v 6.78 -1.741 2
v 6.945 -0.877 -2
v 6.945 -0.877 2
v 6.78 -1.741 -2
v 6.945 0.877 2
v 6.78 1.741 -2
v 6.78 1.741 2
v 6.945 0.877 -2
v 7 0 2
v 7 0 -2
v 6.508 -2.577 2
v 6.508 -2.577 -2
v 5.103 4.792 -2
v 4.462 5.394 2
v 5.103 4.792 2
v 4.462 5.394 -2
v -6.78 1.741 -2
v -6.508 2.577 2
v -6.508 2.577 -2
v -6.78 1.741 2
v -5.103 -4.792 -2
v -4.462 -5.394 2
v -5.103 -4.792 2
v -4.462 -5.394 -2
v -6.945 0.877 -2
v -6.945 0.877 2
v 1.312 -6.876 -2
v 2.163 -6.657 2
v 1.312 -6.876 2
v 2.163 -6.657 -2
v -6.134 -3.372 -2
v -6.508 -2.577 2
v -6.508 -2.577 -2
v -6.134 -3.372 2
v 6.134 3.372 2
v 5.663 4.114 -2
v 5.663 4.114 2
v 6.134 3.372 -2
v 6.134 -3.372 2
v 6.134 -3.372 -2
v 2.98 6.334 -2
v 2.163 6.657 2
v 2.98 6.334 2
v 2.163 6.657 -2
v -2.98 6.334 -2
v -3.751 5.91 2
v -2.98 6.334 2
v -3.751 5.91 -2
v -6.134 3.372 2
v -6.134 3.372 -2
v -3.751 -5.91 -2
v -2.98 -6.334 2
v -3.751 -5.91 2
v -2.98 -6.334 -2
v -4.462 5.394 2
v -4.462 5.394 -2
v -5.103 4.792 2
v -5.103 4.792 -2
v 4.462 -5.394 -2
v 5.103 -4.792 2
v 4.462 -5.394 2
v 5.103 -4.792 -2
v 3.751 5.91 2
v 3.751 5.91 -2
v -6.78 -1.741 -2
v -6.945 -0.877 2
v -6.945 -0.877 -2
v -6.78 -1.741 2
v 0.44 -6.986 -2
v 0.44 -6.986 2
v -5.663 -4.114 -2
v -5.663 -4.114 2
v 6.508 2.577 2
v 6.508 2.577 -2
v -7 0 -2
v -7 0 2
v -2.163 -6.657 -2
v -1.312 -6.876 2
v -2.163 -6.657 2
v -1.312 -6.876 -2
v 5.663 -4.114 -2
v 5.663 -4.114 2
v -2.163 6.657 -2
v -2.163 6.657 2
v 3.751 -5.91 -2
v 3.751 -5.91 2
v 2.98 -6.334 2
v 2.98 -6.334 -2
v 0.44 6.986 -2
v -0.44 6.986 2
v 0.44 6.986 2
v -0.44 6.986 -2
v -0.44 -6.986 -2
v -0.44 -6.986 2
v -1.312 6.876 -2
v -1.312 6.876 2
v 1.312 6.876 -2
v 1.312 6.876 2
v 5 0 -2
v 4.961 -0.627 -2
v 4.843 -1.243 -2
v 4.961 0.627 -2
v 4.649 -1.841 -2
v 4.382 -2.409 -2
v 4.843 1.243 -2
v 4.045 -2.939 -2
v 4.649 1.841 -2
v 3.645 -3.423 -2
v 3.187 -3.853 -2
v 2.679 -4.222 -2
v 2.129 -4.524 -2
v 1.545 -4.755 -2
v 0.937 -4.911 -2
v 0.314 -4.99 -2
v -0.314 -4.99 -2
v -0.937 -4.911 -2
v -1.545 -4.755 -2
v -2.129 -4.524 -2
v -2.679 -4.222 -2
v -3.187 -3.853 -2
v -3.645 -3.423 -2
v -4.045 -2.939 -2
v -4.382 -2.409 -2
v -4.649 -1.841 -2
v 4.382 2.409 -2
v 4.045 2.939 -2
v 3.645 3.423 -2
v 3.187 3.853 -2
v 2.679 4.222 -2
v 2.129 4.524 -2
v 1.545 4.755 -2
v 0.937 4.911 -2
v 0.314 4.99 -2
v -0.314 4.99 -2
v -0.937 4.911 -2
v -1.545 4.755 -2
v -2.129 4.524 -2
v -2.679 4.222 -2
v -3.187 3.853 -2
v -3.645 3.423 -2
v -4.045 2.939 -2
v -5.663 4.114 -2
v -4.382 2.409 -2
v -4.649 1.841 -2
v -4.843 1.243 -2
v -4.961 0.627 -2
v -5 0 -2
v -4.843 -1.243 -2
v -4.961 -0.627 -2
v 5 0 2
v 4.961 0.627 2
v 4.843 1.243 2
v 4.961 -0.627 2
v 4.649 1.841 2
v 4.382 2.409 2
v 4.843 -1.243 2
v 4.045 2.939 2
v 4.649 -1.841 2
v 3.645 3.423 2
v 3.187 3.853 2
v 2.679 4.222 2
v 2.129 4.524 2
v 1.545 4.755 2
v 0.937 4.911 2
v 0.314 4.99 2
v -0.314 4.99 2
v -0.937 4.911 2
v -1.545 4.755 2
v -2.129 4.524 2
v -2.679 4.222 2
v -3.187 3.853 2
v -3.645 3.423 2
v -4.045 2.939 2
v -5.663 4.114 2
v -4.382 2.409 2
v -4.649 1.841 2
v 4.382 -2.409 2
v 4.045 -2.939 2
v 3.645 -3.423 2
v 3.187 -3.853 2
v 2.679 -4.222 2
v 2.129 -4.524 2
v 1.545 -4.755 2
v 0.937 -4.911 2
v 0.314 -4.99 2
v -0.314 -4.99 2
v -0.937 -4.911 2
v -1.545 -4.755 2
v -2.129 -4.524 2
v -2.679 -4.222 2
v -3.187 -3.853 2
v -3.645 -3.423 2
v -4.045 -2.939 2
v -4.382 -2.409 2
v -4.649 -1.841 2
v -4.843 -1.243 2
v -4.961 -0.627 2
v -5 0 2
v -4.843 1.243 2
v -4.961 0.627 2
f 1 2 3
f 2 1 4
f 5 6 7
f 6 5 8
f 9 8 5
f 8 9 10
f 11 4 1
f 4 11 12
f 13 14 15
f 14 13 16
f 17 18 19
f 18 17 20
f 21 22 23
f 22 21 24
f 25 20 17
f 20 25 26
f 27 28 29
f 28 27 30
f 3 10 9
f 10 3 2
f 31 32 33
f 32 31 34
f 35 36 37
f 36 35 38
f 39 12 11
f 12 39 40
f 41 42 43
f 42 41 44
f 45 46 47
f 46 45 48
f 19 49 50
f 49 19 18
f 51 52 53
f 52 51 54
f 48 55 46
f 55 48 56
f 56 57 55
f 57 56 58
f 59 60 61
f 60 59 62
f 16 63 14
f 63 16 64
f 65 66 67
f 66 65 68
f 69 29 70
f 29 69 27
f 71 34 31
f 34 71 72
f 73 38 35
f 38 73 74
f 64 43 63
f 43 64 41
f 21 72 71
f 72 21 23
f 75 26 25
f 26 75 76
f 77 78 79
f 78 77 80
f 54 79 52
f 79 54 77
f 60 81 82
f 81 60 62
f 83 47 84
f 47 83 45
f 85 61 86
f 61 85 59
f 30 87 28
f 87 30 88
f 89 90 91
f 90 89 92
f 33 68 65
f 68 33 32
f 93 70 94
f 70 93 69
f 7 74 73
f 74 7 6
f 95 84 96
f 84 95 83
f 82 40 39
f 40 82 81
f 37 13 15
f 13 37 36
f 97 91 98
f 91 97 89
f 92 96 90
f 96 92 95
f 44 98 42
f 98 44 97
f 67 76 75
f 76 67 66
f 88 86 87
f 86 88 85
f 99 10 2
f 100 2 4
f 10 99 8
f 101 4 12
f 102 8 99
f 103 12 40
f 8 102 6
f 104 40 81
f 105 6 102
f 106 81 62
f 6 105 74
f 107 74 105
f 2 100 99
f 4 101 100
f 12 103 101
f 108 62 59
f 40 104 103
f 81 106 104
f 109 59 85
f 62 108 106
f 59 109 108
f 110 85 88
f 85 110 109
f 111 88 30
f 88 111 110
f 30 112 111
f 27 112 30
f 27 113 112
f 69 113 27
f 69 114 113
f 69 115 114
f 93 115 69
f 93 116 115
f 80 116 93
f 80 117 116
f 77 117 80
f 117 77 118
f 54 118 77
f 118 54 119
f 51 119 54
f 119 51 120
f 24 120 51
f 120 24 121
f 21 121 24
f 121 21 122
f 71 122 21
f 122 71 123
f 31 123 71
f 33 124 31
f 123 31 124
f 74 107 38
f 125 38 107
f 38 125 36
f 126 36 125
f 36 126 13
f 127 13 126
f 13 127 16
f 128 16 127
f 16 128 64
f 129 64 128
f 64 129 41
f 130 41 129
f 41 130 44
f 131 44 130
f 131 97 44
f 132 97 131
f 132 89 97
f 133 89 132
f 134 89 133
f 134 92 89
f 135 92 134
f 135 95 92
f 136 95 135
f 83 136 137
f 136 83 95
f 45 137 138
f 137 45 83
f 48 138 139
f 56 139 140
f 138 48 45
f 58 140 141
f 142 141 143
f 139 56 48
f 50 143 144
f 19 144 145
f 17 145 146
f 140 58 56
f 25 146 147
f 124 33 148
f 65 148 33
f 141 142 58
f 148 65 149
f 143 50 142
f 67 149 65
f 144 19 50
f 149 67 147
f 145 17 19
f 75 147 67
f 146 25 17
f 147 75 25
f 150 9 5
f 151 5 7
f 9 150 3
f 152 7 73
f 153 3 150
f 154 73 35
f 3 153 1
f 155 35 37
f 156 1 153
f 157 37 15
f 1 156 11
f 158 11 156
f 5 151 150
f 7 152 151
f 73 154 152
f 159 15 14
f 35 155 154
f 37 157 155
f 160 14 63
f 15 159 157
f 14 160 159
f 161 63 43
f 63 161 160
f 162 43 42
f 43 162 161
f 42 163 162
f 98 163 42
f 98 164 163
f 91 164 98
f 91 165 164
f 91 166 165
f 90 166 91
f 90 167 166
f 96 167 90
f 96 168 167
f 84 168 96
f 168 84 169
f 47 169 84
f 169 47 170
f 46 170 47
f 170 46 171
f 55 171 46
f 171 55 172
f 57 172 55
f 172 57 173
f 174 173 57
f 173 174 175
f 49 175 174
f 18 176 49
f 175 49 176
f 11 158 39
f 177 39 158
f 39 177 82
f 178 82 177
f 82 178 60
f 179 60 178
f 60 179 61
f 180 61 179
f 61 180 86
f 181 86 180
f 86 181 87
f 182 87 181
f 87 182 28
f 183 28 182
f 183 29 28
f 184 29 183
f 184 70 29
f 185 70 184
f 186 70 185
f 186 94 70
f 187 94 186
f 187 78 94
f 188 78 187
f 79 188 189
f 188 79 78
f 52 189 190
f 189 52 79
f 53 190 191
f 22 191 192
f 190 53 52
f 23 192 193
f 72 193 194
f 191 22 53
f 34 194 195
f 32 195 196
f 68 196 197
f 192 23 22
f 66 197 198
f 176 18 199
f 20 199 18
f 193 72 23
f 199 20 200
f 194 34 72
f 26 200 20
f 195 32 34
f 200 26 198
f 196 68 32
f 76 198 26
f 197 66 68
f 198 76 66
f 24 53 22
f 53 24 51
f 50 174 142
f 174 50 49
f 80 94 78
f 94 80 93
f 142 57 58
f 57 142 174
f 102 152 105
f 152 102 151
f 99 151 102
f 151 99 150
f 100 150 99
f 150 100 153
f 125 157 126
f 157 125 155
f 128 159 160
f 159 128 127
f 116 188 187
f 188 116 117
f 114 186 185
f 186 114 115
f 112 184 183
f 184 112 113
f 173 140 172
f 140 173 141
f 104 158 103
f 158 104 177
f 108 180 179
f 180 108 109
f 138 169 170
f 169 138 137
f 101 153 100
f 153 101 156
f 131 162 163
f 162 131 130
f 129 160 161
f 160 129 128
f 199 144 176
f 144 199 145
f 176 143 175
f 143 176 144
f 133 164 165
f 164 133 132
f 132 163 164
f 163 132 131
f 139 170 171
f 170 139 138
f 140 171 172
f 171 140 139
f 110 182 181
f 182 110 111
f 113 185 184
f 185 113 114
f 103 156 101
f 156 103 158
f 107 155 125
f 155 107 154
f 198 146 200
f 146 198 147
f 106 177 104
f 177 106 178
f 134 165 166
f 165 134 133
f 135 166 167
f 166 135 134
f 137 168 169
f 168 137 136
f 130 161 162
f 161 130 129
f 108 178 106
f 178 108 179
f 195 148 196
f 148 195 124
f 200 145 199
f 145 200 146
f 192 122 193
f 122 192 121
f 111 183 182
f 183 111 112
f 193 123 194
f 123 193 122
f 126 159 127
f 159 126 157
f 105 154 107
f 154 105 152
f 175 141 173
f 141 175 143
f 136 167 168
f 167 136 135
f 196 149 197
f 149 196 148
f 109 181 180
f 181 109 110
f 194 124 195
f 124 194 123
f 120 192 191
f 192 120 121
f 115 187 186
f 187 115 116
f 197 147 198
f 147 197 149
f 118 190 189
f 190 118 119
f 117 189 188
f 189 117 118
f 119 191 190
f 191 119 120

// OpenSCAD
$fn = 50;


difference() {
	union() {
		translate(v = [0, 0, -2.0000000000]) {
			cylinder(h = 4, r = 7.0000000000);
		}
	}
	union() {
		translate(v = [0, 0, -100.0000000000]) {
			cylinder(h = 200, r = 5.0000000000);
		}
	}
}
